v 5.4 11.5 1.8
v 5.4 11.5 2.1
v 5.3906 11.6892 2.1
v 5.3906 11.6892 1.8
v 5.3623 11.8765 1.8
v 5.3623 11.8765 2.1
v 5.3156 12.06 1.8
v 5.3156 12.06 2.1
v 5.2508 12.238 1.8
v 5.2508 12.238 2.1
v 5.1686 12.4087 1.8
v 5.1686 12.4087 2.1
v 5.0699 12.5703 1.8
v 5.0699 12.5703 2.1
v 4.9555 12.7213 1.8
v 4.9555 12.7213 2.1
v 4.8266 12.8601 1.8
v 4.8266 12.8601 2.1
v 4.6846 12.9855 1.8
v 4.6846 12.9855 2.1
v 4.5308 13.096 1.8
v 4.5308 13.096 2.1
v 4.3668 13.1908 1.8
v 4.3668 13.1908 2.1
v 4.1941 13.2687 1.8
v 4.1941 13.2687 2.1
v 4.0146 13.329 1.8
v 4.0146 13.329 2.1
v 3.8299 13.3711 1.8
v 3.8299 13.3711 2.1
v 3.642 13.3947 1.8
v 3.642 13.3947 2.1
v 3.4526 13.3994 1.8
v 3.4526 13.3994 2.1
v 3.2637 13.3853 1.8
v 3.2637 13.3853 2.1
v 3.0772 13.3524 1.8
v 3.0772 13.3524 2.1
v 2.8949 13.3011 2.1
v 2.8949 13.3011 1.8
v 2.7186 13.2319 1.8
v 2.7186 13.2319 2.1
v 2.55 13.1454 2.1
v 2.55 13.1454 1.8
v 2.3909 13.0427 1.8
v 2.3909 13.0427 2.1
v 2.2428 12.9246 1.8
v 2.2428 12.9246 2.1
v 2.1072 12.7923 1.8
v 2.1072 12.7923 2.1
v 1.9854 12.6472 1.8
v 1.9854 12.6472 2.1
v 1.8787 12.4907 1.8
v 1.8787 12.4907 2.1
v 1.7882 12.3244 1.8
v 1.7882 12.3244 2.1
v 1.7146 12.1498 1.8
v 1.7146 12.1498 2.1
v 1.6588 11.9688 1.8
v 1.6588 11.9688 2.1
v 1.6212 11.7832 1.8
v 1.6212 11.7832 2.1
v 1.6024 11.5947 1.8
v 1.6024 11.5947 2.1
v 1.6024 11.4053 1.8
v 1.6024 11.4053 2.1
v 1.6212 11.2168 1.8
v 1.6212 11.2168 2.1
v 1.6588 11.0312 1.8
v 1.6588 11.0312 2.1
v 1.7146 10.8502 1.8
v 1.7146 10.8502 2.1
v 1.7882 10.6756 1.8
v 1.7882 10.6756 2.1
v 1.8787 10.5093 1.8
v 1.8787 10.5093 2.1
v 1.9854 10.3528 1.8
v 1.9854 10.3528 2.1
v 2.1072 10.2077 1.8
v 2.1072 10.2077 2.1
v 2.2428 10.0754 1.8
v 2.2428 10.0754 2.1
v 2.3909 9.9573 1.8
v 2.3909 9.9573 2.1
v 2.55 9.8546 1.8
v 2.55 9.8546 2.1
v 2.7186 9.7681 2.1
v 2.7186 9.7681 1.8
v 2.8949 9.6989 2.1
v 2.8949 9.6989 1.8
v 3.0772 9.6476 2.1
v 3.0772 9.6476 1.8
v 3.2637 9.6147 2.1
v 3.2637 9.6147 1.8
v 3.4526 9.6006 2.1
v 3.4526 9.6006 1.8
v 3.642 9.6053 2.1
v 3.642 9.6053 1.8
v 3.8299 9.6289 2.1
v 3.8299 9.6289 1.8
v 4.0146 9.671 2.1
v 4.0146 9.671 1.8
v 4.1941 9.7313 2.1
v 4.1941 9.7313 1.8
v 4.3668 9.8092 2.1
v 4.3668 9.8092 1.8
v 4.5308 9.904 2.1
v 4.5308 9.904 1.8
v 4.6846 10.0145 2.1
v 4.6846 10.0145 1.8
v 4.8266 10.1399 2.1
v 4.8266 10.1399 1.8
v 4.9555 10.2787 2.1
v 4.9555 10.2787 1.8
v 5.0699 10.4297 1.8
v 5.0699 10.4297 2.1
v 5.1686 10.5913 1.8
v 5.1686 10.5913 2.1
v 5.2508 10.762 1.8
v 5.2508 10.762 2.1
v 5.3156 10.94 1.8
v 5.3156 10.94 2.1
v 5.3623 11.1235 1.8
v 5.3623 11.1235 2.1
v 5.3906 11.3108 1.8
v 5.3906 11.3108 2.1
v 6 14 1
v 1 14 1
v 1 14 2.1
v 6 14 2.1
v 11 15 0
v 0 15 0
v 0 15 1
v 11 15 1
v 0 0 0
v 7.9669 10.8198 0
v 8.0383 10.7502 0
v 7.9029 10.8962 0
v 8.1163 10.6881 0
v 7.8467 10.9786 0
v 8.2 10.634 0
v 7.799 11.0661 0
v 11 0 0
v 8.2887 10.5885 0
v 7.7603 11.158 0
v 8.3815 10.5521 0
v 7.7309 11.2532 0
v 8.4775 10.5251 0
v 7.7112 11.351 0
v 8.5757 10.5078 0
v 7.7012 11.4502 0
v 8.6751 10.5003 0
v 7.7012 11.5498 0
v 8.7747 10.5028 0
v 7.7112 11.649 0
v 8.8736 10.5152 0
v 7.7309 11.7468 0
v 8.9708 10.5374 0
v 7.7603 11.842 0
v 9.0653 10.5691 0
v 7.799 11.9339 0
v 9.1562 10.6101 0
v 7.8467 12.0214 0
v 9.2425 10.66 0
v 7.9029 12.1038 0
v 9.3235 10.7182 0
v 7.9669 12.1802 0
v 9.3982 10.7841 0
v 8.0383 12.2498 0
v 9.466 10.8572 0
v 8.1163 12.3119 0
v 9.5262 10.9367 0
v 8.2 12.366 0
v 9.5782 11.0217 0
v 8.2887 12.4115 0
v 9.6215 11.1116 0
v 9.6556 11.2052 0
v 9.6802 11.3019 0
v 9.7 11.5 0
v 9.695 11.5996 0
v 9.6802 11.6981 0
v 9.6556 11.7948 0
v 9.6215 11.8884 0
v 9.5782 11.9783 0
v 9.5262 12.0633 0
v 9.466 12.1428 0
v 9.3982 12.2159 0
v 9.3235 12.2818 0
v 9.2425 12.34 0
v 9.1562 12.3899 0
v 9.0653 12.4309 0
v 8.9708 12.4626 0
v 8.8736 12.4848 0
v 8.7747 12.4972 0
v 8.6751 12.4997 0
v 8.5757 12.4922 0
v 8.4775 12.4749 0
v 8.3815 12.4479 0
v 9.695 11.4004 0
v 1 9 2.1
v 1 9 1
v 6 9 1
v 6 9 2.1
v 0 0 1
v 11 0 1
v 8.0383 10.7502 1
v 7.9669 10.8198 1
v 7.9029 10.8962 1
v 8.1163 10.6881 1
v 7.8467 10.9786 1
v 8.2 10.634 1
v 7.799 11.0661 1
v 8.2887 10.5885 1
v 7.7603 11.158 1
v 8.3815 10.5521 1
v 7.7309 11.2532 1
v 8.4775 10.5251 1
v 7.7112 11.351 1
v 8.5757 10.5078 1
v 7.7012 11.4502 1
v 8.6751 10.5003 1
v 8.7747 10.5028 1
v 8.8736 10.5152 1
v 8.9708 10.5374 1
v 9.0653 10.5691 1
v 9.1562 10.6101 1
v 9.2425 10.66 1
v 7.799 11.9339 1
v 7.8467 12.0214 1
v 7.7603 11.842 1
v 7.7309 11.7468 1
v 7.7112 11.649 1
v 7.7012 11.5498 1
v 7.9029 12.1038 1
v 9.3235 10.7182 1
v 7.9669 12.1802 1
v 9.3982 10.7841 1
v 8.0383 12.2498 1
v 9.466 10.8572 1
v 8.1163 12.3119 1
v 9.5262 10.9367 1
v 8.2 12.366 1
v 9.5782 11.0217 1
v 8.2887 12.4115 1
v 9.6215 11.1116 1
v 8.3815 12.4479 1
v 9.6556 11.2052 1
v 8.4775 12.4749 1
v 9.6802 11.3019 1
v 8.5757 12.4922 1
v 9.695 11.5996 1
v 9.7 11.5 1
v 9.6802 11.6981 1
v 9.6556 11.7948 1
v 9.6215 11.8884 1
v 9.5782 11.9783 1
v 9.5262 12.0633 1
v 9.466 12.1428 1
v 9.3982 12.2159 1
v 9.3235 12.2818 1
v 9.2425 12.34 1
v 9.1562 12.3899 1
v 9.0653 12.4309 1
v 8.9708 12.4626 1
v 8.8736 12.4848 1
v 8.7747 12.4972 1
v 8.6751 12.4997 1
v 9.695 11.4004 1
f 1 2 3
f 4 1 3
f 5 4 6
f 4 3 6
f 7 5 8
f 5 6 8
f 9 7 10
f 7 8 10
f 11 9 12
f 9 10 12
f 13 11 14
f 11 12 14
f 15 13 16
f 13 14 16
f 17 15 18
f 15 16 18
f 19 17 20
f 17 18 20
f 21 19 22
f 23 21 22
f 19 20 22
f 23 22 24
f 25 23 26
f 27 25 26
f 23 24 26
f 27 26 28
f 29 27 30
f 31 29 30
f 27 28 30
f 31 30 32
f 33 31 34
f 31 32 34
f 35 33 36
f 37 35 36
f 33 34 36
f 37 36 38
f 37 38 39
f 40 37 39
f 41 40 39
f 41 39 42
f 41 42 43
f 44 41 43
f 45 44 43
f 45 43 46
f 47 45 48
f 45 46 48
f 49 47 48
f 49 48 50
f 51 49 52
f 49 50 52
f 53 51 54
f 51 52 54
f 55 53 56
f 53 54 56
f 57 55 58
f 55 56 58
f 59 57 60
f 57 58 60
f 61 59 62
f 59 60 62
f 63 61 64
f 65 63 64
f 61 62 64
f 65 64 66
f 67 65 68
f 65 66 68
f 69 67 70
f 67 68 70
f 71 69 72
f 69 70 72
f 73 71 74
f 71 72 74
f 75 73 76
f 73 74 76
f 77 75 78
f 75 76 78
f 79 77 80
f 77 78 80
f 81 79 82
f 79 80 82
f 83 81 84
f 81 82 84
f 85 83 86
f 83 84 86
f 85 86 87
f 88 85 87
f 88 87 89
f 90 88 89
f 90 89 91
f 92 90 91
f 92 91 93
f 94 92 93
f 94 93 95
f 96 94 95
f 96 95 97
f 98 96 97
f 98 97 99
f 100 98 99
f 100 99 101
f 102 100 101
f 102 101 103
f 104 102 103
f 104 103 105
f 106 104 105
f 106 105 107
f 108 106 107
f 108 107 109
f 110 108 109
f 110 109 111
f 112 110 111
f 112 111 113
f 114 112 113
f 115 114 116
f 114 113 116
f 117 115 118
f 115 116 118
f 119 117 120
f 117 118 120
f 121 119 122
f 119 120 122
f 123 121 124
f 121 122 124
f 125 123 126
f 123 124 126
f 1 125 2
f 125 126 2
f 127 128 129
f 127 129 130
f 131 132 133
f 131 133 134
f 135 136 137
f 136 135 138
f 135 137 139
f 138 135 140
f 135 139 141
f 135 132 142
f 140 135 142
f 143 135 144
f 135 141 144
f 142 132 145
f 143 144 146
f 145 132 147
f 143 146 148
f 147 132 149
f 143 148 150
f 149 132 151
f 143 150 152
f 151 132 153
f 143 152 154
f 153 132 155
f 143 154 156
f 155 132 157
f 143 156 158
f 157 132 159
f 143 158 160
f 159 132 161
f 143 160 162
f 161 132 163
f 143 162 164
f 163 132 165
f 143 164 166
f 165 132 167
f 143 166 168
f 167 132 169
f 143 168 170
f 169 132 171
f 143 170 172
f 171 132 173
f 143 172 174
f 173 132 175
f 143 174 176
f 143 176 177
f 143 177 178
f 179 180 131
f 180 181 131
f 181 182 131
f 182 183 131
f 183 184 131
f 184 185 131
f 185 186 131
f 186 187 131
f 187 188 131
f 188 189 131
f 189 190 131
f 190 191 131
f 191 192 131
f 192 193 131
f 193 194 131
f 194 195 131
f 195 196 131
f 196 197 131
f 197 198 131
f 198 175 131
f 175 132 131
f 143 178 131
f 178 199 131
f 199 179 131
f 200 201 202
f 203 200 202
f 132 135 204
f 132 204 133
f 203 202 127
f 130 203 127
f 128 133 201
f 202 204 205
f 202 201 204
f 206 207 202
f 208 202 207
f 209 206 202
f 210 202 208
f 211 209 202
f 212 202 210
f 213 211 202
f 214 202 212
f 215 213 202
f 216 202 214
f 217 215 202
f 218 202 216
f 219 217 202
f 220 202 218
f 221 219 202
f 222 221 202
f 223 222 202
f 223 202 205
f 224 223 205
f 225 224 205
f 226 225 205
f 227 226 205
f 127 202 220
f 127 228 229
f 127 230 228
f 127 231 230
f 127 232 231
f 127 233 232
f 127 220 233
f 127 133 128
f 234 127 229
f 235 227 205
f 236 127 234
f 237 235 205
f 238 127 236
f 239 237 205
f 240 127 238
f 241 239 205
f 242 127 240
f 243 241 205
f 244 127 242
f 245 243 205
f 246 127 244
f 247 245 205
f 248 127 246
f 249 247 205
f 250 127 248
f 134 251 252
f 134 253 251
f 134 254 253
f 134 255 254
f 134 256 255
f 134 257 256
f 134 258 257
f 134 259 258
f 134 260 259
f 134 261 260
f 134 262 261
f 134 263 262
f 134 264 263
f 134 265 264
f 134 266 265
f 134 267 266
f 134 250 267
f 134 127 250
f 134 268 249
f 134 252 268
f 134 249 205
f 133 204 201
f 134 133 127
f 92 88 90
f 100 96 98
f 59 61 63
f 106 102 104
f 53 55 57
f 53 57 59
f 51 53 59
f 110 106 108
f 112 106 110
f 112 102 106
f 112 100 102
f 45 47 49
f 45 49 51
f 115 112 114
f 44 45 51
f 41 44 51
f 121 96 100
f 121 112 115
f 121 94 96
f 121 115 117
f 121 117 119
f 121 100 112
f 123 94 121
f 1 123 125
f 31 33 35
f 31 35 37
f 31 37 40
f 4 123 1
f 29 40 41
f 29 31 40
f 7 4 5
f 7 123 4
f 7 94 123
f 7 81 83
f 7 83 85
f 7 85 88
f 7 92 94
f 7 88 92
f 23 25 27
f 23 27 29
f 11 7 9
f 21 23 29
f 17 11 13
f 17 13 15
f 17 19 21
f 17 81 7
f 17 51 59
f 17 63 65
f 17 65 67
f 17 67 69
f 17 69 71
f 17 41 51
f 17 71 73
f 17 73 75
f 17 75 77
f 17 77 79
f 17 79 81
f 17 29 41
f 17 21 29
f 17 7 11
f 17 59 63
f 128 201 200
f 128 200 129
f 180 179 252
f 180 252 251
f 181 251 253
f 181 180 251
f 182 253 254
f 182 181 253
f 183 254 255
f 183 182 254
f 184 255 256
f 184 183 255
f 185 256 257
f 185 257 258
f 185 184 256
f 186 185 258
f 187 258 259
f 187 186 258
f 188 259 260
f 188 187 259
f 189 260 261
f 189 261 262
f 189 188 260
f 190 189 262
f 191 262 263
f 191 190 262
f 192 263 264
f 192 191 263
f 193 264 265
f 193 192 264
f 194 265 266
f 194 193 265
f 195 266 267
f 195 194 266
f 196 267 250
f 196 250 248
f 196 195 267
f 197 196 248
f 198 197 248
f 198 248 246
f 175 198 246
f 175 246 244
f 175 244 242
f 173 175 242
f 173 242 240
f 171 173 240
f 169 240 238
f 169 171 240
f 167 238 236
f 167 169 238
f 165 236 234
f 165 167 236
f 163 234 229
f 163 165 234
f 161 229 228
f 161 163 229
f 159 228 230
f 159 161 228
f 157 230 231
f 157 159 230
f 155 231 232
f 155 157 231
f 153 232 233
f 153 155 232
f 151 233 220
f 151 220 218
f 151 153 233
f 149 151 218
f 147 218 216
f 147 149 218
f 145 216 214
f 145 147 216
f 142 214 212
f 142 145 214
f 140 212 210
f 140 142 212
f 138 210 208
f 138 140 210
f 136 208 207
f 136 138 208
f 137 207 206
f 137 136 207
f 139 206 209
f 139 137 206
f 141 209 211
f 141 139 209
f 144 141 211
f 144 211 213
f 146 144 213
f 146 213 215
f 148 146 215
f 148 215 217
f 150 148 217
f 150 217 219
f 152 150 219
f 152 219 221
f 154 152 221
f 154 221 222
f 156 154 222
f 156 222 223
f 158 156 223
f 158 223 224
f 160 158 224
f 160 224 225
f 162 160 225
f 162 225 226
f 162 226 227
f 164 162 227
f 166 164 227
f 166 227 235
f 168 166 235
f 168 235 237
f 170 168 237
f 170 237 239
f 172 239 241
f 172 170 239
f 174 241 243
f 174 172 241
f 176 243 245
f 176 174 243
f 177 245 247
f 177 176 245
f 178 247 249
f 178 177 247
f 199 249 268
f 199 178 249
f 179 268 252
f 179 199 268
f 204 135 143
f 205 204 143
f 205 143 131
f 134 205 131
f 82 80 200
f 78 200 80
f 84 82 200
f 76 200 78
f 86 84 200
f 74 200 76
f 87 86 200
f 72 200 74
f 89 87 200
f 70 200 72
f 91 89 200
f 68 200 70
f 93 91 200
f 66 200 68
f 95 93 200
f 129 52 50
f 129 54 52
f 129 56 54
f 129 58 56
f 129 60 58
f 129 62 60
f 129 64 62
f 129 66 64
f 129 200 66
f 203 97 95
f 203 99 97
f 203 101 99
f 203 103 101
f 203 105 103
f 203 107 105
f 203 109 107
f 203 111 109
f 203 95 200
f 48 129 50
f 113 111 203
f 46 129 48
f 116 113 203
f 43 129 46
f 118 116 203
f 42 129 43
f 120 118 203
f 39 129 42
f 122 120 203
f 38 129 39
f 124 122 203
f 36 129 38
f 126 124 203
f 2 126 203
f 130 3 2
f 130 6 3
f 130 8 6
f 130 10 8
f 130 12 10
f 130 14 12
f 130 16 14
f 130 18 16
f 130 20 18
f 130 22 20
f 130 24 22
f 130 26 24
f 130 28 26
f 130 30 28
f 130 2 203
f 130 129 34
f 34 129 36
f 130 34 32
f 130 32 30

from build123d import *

# Parameters (mm, degrees)
SKETCH_W     = 11
SKETCH_H     = 15
SKETCH_R     = 1
PAD_DEPTH    = 1
SKETCH001_W  = 5
SKETCH001_H  = 5
PAD001_DEPTH = 1.1
SKETCH002_R  = 1.9
POCKET_DEPTH = 0.3


with BuildPart() as part:
    # Sketch → Pad (new body)
    with BuildSketch(Plane.XY):
        with Locations((5.5, 7.5)):
            Rectangle(SKETCH_W, SKETCH_H)
        with Locations((8.7, 11.5)):
            Circle(SKETCH_R, mode=Mode.SUBTRACT)
    extrude(amount=PAD_DEPTH)

    # Sketch001 (on Face7 of Pad) → Pad001 (join)
    with BuildSketch(Plane.XY.offset(1)):
        with Locations((3.5, 11.5)):
            Rectangle(SKETCH001_W, SKETCH001_H)
    extrude(amount=PAD001_DEPTH)

    # Sketch002 (on Face12 of Pad001) → Pocket (cut)
    with BuildSketch(Plane.XY.offset(2.1)):
        with Locations((3.5, 11.5)):
            Circle(SKETCH002_R)
    extrude(amount=-POCKET_DEPTH, mode=Mode.SUBTRACT)


solid = part.part
